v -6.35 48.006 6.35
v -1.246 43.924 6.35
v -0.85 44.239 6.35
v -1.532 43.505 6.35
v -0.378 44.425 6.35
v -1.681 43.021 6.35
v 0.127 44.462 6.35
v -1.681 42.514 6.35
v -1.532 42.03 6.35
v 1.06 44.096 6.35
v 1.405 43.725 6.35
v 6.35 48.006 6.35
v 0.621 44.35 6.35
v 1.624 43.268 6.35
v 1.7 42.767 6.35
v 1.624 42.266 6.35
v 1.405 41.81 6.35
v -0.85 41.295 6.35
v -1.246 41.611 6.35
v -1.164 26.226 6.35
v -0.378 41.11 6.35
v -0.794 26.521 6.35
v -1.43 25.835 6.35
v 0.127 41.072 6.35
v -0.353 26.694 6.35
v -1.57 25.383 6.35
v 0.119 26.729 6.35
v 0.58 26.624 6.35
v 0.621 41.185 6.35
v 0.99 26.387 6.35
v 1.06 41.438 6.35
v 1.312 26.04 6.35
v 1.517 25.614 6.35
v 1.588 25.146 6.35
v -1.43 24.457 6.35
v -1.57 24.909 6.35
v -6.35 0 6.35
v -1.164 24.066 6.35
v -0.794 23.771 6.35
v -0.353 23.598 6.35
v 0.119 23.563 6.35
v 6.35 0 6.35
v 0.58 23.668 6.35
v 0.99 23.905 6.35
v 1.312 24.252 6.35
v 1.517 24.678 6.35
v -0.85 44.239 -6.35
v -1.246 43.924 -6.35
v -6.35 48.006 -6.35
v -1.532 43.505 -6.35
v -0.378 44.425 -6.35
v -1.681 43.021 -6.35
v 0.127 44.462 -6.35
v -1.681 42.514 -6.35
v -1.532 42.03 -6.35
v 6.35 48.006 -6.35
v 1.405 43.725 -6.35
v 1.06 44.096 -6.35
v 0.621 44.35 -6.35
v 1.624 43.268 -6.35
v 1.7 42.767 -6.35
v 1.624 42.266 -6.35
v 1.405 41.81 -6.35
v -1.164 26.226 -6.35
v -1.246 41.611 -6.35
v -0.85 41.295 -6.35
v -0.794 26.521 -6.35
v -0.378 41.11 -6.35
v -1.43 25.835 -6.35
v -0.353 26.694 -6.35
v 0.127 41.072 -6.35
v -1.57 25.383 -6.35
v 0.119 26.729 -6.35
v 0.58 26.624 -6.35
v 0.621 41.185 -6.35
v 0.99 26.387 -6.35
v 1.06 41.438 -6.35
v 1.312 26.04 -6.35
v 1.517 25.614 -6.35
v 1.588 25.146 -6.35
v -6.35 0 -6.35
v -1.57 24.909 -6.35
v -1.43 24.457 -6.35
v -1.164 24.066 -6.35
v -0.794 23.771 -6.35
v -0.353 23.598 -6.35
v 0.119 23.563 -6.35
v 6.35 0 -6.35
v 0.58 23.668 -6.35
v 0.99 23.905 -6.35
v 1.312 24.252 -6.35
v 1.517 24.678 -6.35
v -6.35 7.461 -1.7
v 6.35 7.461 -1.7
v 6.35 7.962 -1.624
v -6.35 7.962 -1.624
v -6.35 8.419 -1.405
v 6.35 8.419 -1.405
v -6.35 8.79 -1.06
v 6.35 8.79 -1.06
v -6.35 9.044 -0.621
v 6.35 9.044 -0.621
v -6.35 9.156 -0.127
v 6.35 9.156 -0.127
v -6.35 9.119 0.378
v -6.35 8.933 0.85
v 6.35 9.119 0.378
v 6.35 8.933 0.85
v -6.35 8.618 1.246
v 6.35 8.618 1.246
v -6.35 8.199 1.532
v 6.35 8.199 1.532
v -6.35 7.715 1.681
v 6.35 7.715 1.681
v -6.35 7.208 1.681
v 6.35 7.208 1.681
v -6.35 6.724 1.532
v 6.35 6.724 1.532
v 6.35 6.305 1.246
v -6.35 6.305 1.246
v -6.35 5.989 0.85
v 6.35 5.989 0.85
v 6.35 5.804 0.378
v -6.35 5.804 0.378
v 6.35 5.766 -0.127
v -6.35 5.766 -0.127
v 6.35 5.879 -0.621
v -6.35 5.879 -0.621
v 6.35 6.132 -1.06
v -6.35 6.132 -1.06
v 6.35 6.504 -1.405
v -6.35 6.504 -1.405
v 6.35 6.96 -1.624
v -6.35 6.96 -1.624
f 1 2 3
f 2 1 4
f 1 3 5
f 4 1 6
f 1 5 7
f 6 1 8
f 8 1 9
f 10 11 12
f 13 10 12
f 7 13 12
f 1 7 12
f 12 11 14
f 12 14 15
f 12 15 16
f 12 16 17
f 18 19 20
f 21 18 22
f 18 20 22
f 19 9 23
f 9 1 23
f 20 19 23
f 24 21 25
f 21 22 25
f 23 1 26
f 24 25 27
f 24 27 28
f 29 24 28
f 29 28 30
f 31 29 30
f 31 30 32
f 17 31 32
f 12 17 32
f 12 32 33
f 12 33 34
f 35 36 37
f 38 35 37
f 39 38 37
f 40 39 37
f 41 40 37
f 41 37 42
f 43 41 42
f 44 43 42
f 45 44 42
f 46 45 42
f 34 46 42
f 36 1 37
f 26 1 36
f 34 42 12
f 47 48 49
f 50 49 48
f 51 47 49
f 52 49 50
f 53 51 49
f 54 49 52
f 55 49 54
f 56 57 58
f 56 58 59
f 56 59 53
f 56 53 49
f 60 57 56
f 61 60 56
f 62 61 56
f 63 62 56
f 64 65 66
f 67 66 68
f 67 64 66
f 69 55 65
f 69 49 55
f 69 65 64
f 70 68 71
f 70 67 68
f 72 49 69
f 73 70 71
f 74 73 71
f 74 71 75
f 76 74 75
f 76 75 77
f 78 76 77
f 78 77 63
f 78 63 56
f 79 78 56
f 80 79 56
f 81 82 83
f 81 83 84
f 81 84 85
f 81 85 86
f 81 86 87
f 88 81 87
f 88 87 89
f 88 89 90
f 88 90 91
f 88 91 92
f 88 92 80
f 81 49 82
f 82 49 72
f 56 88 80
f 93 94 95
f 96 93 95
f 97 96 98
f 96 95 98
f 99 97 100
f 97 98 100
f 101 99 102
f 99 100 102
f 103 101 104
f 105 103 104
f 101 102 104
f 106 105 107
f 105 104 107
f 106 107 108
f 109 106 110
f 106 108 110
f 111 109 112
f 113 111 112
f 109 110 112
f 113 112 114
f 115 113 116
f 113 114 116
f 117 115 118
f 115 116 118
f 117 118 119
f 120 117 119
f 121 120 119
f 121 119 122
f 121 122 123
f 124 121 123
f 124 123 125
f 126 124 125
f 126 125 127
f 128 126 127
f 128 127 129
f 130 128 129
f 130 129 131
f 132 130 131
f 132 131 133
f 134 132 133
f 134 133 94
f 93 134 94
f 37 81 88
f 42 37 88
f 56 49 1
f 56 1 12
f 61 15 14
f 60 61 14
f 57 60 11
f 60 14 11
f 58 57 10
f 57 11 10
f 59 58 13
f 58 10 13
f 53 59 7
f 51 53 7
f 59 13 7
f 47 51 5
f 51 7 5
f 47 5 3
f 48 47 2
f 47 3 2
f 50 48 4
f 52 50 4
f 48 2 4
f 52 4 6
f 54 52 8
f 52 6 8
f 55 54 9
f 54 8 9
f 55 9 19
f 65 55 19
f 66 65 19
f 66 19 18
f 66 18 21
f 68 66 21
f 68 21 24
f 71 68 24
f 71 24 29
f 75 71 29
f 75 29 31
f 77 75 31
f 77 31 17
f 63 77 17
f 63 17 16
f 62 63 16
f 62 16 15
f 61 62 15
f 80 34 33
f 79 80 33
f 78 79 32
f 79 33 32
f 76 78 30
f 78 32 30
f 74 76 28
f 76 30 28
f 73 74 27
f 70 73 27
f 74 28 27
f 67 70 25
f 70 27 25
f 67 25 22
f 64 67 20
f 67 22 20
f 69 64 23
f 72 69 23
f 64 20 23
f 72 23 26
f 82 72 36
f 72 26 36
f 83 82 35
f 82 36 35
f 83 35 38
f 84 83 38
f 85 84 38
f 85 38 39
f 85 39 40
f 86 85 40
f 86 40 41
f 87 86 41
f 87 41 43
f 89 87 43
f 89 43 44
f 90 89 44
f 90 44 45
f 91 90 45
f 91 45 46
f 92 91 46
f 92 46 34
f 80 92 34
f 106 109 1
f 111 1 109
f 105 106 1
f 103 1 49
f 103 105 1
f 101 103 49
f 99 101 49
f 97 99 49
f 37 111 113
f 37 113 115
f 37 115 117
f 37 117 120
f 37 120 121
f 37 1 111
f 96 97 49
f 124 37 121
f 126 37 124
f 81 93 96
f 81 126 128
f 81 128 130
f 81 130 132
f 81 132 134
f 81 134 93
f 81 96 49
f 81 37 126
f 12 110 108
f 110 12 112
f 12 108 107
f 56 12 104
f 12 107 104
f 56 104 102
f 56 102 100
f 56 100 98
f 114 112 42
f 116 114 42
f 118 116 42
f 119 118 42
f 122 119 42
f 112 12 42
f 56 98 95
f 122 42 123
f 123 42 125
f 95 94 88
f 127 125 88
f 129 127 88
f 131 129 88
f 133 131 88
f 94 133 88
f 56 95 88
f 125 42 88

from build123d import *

# Parameters (mm, degrees)
SKETCH1_W           = 12.7
SKETCH1_H           = 12.7
BOSS_EXTRUDE1_DEPTH = 48.006
SKETCH2_R           = 1.5875
CUT_EXTRUDE1_DEPTH  = 51.061847109
SKETCH3_R           = 1.7
CUT_EXTRUDE2_DEPTH  = 51.061847109
SKETCH4_R           = 1.7
CUT_EXTRUDE3_DEPTH  = 51.061847109


with BuildPart() as part:
    # Sketch1 → Boss-Extrude1 (new body)
    with BuildSketch(Plane(origin=(0, 0, 0), x_dir=(1, 0, 0), z_dir=(0, 1, 0))):
        Rectangle(SKETCH1_W, SKETCH1_H)
    extrude(amount=BOSS_EXTRUDE1_DEPTH)

    # Sketch2 → Cut-Extrude1 (cut, through all)
    with BuildSketch(Plane.XY.offset(6.35)):
        with Locations((0, 25.146)):
            Circle(SKETCH2_R)
    extrude(amount=-CUT_EXTRUDE1_DEPTH, mode=Mode.SUBTRACT)

    # Sketch3 → Cut-Extrude2 (cut, through all)
    with BuildSketch(Plane.XY.offset(6.35)):
        with Locations((0, 42.76725)):
            Circle(SKETCH3_R)
    extrude(amount=-CUT_EXTRUDE2_DEPTH, mode=Mode.SUBTRACT)

    # Sketch4 → Cut-Extrude3 (cut, through all)
    with BuildSketch(Plane(origin=(6.35, 0, 0), x_dir=(0, 0, -1), z_dir=(1, 0, 0))):
        with Locations((0, 7.46125)):
            Circle(SKETCH4_R)
    extrude(amount=-CUT_EXTRUDE3_DEPTH, mode=Mode.SUBTRACT)


solid = part.part
